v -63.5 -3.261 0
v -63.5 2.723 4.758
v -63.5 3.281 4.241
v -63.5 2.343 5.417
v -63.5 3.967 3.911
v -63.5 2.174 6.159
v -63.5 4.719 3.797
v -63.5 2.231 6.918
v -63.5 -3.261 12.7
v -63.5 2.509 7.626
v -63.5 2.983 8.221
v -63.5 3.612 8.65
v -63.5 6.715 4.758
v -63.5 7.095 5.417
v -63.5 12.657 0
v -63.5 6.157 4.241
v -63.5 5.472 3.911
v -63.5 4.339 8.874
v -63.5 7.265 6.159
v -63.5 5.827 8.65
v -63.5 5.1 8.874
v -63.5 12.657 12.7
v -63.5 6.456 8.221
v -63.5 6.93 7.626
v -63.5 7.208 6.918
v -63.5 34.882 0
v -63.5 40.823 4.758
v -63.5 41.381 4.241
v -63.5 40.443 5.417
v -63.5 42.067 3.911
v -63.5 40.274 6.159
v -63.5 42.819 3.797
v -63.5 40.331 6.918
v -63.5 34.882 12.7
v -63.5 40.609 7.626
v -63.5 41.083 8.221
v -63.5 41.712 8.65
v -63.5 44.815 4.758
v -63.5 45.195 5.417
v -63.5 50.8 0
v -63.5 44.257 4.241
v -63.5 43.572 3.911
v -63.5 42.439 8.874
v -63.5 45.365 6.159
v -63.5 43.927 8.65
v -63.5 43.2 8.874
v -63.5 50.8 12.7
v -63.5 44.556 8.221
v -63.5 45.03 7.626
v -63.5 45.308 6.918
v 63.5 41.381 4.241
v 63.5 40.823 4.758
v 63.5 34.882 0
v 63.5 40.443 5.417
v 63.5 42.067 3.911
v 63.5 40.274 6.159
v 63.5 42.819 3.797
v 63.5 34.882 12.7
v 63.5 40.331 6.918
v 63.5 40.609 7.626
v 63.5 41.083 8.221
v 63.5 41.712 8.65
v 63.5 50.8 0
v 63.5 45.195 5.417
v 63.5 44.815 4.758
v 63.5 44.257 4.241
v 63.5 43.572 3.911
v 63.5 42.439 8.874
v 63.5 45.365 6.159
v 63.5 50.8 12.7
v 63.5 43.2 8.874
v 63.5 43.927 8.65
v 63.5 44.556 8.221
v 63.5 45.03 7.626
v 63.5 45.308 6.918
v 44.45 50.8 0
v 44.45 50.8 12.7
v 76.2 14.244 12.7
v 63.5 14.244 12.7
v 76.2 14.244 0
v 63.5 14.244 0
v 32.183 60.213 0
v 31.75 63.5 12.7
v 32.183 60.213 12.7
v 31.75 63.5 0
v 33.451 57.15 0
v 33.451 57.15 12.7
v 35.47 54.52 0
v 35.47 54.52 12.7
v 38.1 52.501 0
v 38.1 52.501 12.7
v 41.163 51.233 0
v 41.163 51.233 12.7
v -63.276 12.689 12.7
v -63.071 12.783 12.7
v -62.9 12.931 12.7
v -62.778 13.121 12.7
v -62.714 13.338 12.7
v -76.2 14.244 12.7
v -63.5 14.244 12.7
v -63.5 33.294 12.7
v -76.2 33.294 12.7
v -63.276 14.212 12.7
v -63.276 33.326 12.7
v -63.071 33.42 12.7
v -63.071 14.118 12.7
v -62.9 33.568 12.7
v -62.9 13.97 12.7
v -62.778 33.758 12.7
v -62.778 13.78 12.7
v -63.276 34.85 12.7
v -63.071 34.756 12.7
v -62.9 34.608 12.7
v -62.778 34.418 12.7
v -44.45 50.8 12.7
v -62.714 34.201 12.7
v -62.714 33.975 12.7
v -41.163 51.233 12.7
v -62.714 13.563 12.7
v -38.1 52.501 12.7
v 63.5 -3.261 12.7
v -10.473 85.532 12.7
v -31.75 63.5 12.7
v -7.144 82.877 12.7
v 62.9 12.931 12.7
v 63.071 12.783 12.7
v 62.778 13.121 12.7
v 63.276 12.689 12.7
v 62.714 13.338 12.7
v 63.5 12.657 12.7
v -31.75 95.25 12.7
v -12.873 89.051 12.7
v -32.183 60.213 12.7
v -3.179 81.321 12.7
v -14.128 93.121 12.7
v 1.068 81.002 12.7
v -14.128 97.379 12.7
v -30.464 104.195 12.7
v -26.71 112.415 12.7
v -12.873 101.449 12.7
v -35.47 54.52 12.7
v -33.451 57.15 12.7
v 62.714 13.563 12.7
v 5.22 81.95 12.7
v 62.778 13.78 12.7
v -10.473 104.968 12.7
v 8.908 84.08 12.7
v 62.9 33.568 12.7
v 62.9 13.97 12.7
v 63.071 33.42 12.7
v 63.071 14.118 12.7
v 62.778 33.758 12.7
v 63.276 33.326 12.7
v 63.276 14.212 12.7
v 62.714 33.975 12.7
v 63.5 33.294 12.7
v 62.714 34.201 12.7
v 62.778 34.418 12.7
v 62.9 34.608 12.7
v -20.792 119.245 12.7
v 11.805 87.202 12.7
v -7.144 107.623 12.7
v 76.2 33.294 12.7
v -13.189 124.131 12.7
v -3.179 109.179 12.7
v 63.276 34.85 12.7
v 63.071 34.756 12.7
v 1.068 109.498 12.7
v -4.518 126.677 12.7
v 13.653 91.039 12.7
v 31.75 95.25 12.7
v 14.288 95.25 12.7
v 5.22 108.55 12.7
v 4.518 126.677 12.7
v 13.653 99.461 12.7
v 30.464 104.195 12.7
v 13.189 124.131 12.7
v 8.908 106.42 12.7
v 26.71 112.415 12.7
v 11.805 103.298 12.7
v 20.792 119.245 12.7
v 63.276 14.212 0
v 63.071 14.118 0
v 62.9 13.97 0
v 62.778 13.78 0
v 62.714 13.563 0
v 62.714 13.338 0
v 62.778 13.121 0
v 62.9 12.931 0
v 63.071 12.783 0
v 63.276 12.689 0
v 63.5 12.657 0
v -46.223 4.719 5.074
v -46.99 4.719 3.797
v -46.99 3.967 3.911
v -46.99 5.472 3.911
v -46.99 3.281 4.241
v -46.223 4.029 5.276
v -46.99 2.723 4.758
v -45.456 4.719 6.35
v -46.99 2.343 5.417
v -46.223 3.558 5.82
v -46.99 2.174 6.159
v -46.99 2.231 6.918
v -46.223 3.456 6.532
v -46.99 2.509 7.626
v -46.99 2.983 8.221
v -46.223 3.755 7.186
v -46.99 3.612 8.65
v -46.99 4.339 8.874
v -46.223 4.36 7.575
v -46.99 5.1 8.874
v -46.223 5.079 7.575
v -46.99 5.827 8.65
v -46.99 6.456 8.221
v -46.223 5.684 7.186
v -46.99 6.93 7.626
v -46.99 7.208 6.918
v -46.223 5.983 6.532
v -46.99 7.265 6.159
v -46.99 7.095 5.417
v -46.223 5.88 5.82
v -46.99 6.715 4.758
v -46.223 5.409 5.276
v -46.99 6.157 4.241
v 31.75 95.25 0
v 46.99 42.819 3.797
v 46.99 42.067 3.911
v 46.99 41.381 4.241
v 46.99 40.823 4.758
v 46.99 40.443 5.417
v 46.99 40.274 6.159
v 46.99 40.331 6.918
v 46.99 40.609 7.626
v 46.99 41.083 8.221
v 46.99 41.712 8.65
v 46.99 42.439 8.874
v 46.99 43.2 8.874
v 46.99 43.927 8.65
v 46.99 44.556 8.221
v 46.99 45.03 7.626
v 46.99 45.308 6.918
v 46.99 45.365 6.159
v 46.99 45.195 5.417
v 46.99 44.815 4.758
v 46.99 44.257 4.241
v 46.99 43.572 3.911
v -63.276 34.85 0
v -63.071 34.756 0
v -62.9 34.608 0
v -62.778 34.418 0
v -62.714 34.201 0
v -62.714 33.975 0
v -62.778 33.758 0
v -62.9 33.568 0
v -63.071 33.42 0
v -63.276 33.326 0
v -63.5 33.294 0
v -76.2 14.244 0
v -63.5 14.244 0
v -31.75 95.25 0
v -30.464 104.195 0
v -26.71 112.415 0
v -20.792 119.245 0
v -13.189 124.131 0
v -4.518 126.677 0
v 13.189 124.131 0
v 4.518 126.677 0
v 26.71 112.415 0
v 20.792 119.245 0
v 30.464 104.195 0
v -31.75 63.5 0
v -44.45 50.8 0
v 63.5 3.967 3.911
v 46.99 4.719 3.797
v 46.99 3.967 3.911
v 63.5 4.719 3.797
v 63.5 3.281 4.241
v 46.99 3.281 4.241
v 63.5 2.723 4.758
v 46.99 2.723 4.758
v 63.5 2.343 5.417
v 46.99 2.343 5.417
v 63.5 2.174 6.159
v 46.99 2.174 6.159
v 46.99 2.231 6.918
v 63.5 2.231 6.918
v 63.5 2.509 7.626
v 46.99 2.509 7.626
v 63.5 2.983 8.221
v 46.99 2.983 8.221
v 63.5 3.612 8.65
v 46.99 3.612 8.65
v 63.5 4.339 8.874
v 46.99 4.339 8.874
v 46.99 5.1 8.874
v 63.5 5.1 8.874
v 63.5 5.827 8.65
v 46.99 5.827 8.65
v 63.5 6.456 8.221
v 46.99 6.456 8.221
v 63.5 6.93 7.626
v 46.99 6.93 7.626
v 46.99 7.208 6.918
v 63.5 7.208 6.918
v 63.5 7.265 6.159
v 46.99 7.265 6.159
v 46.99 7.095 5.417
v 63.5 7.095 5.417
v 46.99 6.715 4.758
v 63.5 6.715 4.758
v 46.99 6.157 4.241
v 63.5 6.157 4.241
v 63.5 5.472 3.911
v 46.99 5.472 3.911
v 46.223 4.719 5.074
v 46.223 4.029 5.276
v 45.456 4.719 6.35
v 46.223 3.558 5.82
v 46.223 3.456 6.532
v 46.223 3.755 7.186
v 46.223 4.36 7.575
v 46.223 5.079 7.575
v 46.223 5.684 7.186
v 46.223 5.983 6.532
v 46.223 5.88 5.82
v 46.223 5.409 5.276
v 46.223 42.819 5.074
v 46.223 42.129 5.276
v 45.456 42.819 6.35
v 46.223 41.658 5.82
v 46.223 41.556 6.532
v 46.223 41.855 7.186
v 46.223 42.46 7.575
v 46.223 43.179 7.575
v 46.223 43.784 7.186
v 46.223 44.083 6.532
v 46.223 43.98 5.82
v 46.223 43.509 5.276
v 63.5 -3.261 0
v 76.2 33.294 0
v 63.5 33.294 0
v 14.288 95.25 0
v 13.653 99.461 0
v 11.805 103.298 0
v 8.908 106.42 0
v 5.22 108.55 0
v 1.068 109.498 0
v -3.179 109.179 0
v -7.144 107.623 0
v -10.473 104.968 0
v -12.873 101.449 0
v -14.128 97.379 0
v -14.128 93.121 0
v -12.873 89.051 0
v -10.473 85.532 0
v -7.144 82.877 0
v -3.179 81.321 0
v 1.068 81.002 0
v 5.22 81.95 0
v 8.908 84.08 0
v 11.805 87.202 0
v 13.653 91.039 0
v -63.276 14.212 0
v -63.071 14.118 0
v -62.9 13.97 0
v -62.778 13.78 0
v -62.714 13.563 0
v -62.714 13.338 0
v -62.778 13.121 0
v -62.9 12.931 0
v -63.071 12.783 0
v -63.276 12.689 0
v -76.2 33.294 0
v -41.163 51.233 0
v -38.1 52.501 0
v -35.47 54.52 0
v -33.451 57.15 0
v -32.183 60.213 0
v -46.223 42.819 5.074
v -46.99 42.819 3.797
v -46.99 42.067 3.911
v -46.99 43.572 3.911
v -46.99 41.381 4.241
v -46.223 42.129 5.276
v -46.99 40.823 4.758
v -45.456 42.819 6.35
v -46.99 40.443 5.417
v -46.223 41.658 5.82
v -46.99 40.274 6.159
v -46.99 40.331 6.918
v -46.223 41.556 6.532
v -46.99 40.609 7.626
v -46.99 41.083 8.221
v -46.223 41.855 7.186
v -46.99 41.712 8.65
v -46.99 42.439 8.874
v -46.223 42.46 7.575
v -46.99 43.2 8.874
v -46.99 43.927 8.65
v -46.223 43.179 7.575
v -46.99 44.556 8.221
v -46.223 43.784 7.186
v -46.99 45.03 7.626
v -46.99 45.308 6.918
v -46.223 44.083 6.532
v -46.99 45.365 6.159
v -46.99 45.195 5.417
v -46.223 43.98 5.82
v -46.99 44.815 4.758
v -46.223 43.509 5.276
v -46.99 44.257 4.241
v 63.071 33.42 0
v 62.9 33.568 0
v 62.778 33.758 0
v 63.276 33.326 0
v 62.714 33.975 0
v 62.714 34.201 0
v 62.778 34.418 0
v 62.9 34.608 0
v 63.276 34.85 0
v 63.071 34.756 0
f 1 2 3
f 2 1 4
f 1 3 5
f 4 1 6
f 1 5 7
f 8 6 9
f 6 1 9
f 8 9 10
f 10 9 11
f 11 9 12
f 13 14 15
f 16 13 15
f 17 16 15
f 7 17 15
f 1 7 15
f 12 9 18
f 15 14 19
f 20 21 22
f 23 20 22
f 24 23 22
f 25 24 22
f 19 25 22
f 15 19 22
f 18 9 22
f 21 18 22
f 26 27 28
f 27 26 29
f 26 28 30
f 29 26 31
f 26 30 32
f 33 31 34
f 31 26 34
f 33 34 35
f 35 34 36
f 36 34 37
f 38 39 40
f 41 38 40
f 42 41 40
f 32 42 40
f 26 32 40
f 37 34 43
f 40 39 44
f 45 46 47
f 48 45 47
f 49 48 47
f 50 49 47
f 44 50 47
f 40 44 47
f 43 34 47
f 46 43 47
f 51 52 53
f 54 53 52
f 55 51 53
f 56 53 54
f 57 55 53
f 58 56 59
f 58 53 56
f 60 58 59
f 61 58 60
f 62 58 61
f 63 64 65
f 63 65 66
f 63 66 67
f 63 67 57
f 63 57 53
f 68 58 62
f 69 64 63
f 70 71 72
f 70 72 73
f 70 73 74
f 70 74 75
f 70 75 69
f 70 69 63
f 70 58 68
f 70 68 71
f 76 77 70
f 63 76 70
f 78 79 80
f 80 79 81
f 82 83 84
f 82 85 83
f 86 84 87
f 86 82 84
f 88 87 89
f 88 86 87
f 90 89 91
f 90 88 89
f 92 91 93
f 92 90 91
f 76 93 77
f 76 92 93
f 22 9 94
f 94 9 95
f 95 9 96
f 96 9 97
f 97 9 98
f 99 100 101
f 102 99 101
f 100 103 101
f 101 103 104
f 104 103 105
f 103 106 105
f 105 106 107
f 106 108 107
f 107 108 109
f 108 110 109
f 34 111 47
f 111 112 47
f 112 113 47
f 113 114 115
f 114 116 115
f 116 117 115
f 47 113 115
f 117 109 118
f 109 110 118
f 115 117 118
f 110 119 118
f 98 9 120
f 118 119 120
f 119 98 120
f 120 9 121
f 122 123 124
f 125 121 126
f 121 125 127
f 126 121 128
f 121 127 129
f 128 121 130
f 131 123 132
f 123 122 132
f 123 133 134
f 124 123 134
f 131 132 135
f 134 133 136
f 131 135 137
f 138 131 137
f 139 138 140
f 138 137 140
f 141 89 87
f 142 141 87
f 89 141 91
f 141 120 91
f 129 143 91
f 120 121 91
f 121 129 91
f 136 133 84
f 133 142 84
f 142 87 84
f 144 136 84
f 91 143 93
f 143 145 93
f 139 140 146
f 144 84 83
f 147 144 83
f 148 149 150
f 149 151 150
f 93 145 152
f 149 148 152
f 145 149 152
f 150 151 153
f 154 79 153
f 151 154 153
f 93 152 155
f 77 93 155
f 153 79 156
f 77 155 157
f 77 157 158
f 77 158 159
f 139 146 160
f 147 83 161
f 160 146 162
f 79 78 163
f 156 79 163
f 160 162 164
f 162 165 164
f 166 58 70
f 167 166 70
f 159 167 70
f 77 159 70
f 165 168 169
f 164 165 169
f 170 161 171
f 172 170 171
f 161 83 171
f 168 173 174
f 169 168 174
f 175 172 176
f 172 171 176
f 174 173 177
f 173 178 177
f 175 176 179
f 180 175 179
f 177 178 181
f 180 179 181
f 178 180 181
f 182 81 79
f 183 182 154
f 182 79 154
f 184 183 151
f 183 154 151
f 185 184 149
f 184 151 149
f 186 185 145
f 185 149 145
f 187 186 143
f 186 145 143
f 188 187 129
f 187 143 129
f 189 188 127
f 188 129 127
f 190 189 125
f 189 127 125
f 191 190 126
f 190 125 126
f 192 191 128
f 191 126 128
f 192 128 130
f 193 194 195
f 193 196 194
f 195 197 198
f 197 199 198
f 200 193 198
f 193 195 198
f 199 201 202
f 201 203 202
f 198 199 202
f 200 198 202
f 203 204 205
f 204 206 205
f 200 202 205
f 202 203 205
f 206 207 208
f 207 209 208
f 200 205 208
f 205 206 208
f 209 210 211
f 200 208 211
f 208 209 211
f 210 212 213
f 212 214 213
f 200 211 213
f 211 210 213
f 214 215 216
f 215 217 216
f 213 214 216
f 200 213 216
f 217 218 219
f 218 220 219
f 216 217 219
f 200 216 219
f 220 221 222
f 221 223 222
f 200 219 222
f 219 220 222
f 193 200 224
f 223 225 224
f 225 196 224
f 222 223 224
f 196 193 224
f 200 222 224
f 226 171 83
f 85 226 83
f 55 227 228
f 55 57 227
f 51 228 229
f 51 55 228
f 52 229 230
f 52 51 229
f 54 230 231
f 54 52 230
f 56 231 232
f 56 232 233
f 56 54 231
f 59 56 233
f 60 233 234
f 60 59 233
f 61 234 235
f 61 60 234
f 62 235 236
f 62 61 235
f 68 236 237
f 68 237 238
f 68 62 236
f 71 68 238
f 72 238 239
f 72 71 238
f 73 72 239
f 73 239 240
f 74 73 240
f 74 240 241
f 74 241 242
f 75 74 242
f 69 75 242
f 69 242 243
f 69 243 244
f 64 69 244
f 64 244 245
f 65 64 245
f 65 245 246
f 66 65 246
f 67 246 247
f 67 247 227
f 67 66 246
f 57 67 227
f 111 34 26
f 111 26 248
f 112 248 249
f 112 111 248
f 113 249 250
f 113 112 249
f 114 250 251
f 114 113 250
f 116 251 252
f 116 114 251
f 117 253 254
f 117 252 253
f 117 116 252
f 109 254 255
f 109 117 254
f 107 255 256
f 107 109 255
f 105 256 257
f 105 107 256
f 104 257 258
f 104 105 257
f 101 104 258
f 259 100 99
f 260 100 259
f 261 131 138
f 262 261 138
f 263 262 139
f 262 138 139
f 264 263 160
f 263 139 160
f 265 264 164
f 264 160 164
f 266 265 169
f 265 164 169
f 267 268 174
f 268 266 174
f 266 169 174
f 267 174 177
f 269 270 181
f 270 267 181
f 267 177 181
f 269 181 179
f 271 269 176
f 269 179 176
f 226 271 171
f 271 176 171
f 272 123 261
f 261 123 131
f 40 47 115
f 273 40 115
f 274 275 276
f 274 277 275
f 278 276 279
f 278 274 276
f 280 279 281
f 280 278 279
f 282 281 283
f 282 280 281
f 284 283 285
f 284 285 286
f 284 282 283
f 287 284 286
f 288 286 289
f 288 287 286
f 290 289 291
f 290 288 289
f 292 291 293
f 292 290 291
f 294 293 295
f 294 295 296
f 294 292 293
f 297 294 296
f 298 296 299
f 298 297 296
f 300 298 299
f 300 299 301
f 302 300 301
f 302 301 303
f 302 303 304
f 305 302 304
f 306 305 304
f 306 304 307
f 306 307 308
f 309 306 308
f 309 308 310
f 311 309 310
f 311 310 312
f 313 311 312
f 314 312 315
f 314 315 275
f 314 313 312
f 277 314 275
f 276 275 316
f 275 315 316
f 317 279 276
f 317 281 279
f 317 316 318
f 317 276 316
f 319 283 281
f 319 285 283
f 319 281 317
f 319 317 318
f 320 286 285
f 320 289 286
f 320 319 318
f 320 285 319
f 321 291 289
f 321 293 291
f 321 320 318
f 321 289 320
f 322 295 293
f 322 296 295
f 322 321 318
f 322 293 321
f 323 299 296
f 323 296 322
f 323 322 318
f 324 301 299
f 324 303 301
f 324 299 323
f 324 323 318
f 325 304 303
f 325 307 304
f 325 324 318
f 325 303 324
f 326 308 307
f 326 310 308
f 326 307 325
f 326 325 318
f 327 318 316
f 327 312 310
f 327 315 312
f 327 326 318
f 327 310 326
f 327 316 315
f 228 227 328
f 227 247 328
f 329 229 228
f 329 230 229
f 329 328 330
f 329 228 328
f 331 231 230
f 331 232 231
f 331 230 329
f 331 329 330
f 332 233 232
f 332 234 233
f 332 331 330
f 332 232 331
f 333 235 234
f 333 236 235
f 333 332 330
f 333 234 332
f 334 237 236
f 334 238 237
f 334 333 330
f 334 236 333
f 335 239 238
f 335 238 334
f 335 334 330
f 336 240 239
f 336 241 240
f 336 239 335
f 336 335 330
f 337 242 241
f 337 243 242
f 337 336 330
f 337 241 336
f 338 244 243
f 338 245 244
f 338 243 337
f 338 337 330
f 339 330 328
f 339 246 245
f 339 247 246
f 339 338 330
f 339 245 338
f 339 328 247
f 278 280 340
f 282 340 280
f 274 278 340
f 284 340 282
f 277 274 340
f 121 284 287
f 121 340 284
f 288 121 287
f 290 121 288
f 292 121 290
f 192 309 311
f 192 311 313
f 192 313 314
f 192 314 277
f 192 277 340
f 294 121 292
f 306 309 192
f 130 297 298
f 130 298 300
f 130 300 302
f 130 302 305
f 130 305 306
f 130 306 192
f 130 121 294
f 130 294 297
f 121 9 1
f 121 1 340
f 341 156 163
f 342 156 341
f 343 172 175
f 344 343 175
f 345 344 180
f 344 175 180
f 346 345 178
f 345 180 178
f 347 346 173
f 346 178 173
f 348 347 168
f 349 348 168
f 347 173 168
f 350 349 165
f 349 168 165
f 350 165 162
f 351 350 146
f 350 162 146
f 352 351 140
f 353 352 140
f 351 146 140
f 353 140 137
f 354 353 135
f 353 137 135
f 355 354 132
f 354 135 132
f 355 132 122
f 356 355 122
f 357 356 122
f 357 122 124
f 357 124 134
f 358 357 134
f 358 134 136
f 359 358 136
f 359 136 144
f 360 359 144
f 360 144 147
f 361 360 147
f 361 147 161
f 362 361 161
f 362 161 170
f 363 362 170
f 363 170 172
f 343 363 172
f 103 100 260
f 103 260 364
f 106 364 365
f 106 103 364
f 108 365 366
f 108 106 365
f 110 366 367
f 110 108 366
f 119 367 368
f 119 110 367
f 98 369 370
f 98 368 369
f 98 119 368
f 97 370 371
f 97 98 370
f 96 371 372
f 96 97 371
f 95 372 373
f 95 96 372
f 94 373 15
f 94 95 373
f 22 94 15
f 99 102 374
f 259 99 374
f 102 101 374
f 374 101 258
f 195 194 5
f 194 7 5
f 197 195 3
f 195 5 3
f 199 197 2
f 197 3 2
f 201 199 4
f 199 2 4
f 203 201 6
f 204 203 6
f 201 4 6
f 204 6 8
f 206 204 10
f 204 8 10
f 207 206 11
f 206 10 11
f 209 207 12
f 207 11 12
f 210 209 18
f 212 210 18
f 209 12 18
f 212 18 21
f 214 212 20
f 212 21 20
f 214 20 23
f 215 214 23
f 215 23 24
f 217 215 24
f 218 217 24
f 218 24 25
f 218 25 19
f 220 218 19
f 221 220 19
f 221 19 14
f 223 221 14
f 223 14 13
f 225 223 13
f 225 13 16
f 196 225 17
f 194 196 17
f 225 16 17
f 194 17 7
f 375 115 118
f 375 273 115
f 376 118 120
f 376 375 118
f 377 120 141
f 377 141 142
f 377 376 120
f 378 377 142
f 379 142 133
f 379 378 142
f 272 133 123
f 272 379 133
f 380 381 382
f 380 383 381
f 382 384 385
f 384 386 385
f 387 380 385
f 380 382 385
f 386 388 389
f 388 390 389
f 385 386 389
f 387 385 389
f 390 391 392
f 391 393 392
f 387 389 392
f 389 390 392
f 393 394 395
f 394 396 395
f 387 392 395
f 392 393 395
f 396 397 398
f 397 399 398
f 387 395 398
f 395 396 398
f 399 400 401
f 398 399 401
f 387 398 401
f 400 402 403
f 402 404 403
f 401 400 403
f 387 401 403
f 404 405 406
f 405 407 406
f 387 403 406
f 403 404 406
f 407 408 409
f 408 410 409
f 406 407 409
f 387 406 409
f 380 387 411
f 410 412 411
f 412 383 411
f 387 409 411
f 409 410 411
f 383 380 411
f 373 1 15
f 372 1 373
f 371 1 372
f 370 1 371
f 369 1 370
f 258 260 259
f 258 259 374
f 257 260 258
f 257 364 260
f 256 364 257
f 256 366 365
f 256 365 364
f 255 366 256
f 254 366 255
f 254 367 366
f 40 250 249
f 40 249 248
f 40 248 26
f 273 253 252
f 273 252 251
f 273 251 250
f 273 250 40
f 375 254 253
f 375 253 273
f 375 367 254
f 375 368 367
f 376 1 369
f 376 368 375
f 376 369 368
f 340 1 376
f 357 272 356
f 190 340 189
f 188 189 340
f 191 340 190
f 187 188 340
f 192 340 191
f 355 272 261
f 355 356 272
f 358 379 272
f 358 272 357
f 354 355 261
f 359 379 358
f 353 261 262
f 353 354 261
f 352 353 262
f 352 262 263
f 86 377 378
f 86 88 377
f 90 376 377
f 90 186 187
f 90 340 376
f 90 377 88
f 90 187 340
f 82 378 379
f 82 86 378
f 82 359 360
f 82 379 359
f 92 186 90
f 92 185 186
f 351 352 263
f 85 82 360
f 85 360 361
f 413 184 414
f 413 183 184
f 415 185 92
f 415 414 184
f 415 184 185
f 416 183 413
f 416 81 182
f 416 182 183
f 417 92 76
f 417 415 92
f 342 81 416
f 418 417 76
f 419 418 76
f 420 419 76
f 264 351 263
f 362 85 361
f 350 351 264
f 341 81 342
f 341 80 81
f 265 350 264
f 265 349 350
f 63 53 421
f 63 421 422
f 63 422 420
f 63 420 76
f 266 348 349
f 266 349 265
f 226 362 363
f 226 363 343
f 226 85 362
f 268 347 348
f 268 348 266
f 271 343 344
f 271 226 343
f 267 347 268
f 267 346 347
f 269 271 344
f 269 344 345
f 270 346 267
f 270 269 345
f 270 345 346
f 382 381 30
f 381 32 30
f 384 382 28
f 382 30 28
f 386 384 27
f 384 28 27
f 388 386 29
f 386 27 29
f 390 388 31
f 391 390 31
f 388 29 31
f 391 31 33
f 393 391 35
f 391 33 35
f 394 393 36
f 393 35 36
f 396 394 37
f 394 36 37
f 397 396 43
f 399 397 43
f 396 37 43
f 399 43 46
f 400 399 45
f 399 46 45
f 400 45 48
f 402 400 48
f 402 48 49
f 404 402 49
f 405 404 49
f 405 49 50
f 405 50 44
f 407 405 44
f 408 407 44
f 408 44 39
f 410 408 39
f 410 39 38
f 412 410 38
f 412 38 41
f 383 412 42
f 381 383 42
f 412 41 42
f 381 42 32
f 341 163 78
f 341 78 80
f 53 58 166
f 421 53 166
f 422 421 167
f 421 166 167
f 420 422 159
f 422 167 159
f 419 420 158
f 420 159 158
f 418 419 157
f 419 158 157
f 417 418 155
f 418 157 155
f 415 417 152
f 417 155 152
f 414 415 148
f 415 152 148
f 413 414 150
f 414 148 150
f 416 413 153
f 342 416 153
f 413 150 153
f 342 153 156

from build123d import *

# Parameters (mm, degrees)
SKETCH1_W                        = 127
SKETCH1_H                        = 152.4
BOSS_EXTRUDE1_DEPTH              = 12.7
SKETCH2_R                        = 14.2875
CUT_EXTRUDE1_DEPTH               = 13.7
FILLET1_R                        = 12.7
SKETCH3_W                        = 127
SKETCH3_H                        = 3.261499881
BOSS_EXTRUDE2_DEPTH              = 12.7
F_1_4_20_TAPPED_HOLE1_AT_2_COUNT = 2
F_1_4_20_TAPPED_HOLE1_AT_2_PITCH = 38.1
SKETCH6_W                        = 12.7
SKETCH6_H                        = 19.05
BOSS_EXTRUDE3_DEPTH              = 12.7
SKETCH7_R                        = 0.79375
CUT_EXTRUDE2_DEPTH               = 13.7


with BuildPart() as part:
    # Sketch1 → Boss-Extrude1 (new body)
    with BuildSketch(Plane.XY):
        with Locations((0, 76.2)):
            Rectangle(SKETCH1_W, SKETCH1_H)
    extrude(amount=BOSS_EXTRUDE1_DEPTH)

    # Sketch2 → Cut-Extrude1 (cut, through all)
    with BuildSketch(Plane.XY.offset(12.7)):
        with Locations((0, 95.25)):
            Circle(SKETCH2_R)
        with BuildLine():
            Line((31.75, 95.25), (31.75, 50.8))
            Line((31.75, 50.8), (63.5, 50.8))
            Line((63.5, 50.8), (63.5, 152.4))
            Line((63.5, 152.4), (-63.5, 152.4))
            Line((-63.5, 152.4), (-63.5, 50.8))
            Line((-63.5, 50.8), (-31.75, 50.8))
            Line((-31.75, 50.8), (-31.75, 95.25))
            ThreePointArc((-31.75, 95.25), (0, 127), (31.75, 95.25))
        make_face()
    extrude(amount=-CUT_EXTRUDE1_DEPTH, mode=Mode.SUBTRACT)

    # Fillet1
    fillet1_edges = [part.edges().sort_by_distance(p)[0] for p in [
        (-31.75, 50.8, 6.35),
        (31.75, 50.8, 6.35),
    ]]
    fillet(fillet1_edges, radius=FILLET1_R)

    # Sketch3 → Boss-Extrude2 (add)
    with BuildSketch(Plane.XY.offset(12.7)):
        with Locations((0, -1.630749941)):
            Rectangle(SKETCH3_W, SKETCH3_H)
    extrude(amount=-BOSS_EXTRUDE2_DEPTH)

    # Sketch4 → 1/4-20 Tapped Hole1 (revolve, cut)
    with BuildSketch(Plane(origin=(63.5, 42.81925006, 6.35), x_dir=(0, 0, -1), z_dir=(0, 1, 0))):
        Polygon((0, 0), (0, 18.043816902), (2.5527, 16.51), (2.5527, 0), align=None)
    f_1_4_20_tapped_hole1 = revolve(axis=Axis((69.85, 42.81925006, 6.35), (-1, 0, 0)), mode=Mode.SUBTRACT)

    # 1/4-20 Tapped Hole1 at 2: 1/4-20 Tapped Hole1 ×2
    with Locations(*[(0, -i * F_1_4_20_TAPPED_HOLE1_AT_2_PITCH, 0) for i in range(1, F_1_4_20_TAPPED_HOLE1_AT_2_COUNT)]):
        add(f_1_4_20_tapped_hole1, mode=Mode.SUBTRACT)

    # Sketch6 → Boss-Extrude3 (add)
    with BuildSketch(Plane(origin=(63.5, 0, 0), x_dir=(0, 0, -1), z_dir=(1, 0, 0))):
        with Locations((-6.35, 23.76925006)):
            Rectangle(SKETCH6_W, SKETCH6_H)
    boss_extrude3 = extrude(amount=BOSS_EXTRUDE3_DEPTH)

    # Sketch7 → Cut-Extrude2 (cut, through all)
    with BuildSketch(Plane.XY.offset(12.7)):
        with Locations((63.5, 34.08800006)):
            Circle(SKETCH7_R)
        with Locations((63.5, 13.45050006)):
            Circle(SKETCH7_R)
    cut_extrude2 = extrude(amount=-CUT_EXTRUDE2_DEPTH, mode=Mode.SUBTRACT)

    # Mirror1: Cut-Extrude2, Boss-Extrude3, 1/4-20 Tapped Hole1 across plane
    add(cut_extrude2.mirror(Plane(origin=(0, 0, 0), x_dir=(0, 0, 1), z_dir=(1, 0, 0))), mode=Mode.SUBTRACT)
    add(boss_extrude3.mirror(Plane(origin=(0, 0, 0), x_dir=(0, 0, 1), z_dir=(1, 0, 0))))
    add(f_1_4_20_tapped_hole1.mirror(Plane(origin=(0, 0, 0), x_dir=(0, 0, 1), z_dir=(1, 0, 0))), mode=Mode.SUBTRACT)

    # Mirror1 copy 1 sketch → Mirror1 copy 1 (revolve, cut)
    with BuildSketch(Plane(origin=(-63.5, 4.71925006, 6.35), x_dir=(0, 0, -1), z_dir=(0, 1, 0))):
        Polygon((0, 0), (0, -18.043816902), (2.5527, -16.51), (2.5527, 0), align=None)
    revolve(axis=Axis((-69.85, 4.71925006, 6.35), (-1, 0, 0)), mode=Mode.SUBTRACT)


solid = part.part
